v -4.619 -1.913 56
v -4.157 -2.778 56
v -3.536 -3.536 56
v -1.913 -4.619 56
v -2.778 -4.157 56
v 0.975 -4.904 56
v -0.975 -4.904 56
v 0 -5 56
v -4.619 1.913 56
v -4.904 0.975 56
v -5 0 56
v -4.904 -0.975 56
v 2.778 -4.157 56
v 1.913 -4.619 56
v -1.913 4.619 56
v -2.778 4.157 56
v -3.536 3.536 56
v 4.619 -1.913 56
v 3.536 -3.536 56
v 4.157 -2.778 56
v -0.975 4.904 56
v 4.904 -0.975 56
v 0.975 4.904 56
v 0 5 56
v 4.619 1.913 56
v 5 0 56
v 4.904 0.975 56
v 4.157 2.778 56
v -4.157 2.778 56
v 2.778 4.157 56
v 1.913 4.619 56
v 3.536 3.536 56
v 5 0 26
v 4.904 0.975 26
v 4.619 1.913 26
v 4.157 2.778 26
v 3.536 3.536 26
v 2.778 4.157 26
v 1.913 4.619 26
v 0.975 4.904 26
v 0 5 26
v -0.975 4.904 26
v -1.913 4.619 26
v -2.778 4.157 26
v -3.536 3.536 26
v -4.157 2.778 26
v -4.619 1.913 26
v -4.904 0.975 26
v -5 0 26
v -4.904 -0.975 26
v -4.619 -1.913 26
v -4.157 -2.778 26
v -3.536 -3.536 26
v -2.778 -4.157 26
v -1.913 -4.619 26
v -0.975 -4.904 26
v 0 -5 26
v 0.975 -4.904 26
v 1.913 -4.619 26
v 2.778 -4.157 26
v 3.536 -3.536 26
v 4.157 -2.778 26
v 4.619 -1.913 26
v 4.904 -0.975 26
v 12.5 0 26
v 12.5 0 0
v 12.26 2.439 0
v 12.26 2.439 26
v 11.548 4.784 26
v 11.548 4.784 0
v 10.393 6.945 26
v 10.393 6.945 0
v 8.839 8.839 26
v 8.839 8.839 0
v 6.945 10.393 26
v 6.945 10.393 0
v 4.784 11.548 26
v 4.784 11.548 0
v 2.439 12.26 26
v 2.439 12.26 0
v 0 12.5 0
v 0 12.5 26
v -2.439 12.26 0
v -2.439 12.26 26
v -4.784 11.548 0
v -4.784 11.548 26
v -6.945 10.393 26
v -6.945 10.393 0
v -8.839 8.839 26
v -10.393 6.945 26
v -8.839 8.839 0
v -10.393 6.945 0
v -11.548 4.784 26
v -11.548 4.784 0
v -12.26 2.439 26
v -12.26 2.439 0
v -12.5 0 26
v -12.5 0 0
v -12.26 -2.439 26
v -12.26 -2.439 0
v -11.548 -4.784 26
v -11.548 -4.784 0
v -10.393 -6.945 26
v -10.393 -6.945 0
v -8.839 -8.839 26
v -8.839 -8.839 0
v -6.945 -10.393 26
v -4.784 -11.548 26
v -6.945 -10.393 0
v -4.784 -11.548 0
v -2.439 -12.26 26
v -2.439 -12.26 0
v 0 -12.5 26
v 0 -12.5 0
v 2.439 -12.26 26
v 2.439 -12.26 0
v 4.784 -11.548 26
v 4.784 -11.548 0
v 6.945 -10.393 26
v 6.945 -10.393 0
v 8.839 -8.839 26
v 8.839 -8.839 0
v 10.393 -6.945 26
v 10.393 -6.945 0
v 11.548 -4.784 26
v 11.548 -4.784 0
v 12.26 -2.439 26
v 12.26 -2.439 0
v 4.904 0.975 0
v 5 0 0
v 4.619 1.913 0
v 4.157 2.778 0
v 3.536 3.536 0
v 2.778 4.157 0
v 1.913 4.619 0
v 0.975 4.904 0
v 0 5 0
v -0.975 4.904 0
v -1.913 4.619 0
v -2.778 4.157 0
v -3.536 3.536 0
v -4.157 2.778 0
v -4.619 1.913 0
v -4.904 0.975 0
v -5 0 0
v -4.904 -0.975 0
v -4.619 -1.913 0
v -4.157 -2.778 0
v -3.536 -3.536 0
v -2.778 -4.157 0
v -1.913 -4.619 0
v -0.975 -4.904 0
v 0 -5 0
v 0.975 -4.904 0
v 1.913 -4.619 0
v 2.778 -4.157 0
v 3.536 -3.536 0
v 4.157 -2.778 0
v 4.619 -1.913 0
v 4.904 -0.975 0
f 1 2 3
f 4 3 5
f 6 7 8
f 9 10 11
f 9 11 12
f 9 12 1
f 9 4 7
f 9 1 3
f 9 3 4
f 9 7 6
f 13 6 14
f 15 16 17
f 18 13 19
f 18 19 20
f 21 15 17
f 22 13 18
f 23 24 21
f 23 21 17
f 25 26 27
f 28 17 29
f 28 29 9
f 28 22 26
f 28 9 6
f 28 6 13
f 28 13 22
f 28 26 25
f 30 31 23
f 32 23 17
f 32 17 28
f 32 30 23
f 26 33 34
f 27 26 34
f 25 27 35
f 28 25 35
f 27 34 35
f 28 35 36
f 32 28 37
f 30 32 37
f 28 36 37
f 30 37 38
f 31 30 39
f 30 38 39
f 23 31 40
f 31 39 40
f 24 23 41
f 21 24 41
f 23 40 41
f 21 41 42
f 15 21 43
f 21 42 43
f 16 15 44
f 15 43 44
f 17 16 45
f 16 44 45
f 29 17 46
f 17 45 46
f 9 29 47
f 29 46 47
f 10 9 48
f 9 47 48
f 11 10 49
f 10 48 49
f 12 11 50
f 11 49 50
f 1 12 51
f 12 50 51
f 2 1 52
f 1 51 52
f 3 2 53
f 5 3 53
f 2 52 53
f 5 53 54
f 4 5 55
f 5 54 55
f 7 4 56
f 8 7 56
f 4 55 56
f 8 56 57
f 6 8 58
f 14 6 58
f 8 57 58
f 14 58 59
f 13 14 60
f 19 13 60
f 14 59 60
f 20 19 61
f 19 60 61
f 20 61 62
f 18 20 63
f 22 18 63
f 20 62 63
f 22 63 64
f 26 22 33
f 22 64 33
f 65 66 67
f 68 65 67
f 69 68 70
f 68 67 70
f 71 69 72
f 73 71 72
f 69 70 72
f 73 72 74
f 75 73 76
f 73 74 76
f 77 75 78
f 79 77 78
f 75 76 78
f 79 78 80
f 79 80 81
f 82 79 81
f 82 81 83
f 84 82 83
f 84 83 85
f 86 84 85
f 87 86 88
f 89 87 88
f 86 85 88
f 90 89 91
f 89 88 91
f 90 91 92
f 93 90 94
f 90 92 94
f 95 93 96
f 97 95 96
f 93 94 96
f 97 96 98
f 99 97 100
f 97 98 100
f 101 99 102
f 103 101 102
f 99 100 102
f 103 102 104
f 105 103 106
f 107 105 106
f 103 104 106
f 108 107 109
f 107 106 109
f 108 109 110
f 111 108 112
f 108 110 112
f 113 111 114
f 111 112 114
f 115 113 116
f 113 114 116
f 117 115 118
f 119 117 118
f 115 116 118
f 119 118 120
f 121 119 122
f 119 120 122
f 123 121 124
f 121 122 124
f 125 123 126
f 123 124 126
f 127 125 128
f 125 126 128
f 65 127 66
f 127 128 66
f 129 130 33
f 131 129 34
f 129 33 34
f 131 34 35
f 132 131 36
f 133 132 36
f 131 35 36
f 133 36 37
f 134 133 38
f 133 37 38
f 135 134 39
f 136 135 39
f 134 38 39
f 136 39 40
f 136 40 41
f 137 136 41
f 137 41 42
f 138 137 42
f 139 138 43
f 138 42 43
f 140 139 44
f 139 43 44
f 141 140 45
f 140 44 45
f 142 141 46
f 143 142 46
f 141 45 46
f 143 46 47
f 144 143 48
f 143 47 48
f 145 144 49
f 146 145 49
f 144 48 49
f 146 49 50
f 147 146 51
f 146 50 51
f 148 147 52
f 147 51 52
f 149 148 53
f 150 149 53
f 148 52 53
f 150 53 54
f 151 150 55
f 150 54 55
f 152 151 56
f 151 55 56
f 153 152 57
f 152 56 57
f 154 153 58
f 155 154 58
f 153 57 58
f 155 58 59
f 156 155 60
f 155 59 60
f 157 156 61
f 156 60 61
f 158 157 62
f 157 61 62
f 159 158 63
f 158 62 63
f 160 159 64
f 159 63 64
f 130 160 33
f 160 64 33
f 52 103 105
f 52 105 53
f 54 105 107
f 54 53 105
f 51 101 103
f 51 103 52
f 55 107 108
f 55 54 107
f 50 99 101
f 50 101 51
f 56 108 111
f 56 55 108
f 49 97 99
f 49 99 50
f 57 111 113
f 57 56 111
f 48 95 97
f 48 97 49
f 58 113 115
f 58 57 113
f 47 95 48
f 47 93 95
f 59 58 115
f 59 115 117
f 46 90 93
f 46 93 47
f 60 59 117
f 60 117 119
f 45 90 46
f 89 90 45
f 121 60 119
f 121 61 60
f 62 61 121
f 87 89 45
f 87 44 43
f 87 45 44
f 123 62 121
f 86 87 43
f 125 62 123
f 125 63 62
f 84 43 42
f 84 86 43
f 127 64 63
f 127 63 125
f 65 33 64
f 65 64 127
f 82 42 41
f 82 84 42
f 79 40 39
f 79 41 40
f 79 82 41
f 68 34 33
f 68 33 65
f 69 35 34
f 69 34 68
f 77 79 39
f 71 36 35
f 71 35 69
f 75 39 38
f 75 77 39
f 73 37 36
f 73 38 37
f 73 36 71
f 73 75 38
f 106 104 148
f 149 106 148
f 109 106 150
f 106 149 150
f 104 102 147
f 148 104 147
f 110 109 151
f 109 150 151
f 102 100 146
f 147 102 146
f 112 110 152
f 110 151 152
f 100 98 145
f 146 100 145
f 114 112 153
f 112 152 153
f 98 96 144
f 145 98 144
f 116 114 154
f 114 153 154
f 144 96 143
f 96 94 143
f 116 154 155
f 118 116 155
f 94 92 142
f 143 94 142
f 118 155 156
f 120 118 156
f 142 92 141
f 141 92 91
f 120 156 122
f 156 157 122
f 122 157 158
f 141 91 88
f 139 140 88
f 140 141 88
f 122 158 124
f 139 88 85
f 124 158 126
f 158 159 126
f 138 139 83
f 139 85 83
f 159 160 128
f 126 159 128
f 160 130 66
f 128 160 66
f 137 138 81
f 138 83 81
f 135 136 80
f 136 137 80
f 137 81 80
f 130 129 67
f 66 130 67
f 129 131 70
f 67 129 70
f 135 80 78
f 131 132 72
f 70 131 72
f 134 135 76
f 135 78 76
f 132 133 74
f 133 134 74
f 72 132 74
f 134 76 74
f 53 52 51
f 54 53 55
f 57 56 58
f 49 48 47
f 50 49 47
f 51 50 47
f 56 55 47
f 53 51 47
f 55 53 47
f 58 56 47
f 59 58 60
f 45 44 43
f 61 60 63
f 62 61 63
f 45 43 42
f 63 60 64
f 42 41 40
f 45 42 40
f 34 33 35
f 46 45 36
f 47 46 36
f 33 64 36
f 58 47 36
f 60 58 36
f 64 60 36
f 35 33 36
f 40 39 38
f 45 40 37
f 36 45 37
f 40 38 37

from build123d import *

# Parameters (mm, degrees)
F0_R     = 12.5
F1_DEPTH = 26
F2_R     = 5
F3_DEPTH = 26
F4_R     = 5
F5_DEPTH = 30


with BuildPart() as f1:
    # F0 (on Top) → F1 (new body)
    with BuildSketch(Plane.XY):
        Circle(F0_R)
    extrude(amount=F1_DEPTH)

    # F2 (on face) → F3 (cut)
    with BuildSketch(Plane.XY.offset(26)):
        Circle(F2_R)
    extrude(amount=-F3_DEPTH, mode=Mode.SUBTRACT)


with BuildPart() as f5:
    # F4 (on face) → F5 (new body)
    with BuildSketch(Plane.XY.offset(26)):
        Circle(F4_R)
    extrude(amount=F5_DEPTH)


solid = Compound([f1.part, f5.part])
